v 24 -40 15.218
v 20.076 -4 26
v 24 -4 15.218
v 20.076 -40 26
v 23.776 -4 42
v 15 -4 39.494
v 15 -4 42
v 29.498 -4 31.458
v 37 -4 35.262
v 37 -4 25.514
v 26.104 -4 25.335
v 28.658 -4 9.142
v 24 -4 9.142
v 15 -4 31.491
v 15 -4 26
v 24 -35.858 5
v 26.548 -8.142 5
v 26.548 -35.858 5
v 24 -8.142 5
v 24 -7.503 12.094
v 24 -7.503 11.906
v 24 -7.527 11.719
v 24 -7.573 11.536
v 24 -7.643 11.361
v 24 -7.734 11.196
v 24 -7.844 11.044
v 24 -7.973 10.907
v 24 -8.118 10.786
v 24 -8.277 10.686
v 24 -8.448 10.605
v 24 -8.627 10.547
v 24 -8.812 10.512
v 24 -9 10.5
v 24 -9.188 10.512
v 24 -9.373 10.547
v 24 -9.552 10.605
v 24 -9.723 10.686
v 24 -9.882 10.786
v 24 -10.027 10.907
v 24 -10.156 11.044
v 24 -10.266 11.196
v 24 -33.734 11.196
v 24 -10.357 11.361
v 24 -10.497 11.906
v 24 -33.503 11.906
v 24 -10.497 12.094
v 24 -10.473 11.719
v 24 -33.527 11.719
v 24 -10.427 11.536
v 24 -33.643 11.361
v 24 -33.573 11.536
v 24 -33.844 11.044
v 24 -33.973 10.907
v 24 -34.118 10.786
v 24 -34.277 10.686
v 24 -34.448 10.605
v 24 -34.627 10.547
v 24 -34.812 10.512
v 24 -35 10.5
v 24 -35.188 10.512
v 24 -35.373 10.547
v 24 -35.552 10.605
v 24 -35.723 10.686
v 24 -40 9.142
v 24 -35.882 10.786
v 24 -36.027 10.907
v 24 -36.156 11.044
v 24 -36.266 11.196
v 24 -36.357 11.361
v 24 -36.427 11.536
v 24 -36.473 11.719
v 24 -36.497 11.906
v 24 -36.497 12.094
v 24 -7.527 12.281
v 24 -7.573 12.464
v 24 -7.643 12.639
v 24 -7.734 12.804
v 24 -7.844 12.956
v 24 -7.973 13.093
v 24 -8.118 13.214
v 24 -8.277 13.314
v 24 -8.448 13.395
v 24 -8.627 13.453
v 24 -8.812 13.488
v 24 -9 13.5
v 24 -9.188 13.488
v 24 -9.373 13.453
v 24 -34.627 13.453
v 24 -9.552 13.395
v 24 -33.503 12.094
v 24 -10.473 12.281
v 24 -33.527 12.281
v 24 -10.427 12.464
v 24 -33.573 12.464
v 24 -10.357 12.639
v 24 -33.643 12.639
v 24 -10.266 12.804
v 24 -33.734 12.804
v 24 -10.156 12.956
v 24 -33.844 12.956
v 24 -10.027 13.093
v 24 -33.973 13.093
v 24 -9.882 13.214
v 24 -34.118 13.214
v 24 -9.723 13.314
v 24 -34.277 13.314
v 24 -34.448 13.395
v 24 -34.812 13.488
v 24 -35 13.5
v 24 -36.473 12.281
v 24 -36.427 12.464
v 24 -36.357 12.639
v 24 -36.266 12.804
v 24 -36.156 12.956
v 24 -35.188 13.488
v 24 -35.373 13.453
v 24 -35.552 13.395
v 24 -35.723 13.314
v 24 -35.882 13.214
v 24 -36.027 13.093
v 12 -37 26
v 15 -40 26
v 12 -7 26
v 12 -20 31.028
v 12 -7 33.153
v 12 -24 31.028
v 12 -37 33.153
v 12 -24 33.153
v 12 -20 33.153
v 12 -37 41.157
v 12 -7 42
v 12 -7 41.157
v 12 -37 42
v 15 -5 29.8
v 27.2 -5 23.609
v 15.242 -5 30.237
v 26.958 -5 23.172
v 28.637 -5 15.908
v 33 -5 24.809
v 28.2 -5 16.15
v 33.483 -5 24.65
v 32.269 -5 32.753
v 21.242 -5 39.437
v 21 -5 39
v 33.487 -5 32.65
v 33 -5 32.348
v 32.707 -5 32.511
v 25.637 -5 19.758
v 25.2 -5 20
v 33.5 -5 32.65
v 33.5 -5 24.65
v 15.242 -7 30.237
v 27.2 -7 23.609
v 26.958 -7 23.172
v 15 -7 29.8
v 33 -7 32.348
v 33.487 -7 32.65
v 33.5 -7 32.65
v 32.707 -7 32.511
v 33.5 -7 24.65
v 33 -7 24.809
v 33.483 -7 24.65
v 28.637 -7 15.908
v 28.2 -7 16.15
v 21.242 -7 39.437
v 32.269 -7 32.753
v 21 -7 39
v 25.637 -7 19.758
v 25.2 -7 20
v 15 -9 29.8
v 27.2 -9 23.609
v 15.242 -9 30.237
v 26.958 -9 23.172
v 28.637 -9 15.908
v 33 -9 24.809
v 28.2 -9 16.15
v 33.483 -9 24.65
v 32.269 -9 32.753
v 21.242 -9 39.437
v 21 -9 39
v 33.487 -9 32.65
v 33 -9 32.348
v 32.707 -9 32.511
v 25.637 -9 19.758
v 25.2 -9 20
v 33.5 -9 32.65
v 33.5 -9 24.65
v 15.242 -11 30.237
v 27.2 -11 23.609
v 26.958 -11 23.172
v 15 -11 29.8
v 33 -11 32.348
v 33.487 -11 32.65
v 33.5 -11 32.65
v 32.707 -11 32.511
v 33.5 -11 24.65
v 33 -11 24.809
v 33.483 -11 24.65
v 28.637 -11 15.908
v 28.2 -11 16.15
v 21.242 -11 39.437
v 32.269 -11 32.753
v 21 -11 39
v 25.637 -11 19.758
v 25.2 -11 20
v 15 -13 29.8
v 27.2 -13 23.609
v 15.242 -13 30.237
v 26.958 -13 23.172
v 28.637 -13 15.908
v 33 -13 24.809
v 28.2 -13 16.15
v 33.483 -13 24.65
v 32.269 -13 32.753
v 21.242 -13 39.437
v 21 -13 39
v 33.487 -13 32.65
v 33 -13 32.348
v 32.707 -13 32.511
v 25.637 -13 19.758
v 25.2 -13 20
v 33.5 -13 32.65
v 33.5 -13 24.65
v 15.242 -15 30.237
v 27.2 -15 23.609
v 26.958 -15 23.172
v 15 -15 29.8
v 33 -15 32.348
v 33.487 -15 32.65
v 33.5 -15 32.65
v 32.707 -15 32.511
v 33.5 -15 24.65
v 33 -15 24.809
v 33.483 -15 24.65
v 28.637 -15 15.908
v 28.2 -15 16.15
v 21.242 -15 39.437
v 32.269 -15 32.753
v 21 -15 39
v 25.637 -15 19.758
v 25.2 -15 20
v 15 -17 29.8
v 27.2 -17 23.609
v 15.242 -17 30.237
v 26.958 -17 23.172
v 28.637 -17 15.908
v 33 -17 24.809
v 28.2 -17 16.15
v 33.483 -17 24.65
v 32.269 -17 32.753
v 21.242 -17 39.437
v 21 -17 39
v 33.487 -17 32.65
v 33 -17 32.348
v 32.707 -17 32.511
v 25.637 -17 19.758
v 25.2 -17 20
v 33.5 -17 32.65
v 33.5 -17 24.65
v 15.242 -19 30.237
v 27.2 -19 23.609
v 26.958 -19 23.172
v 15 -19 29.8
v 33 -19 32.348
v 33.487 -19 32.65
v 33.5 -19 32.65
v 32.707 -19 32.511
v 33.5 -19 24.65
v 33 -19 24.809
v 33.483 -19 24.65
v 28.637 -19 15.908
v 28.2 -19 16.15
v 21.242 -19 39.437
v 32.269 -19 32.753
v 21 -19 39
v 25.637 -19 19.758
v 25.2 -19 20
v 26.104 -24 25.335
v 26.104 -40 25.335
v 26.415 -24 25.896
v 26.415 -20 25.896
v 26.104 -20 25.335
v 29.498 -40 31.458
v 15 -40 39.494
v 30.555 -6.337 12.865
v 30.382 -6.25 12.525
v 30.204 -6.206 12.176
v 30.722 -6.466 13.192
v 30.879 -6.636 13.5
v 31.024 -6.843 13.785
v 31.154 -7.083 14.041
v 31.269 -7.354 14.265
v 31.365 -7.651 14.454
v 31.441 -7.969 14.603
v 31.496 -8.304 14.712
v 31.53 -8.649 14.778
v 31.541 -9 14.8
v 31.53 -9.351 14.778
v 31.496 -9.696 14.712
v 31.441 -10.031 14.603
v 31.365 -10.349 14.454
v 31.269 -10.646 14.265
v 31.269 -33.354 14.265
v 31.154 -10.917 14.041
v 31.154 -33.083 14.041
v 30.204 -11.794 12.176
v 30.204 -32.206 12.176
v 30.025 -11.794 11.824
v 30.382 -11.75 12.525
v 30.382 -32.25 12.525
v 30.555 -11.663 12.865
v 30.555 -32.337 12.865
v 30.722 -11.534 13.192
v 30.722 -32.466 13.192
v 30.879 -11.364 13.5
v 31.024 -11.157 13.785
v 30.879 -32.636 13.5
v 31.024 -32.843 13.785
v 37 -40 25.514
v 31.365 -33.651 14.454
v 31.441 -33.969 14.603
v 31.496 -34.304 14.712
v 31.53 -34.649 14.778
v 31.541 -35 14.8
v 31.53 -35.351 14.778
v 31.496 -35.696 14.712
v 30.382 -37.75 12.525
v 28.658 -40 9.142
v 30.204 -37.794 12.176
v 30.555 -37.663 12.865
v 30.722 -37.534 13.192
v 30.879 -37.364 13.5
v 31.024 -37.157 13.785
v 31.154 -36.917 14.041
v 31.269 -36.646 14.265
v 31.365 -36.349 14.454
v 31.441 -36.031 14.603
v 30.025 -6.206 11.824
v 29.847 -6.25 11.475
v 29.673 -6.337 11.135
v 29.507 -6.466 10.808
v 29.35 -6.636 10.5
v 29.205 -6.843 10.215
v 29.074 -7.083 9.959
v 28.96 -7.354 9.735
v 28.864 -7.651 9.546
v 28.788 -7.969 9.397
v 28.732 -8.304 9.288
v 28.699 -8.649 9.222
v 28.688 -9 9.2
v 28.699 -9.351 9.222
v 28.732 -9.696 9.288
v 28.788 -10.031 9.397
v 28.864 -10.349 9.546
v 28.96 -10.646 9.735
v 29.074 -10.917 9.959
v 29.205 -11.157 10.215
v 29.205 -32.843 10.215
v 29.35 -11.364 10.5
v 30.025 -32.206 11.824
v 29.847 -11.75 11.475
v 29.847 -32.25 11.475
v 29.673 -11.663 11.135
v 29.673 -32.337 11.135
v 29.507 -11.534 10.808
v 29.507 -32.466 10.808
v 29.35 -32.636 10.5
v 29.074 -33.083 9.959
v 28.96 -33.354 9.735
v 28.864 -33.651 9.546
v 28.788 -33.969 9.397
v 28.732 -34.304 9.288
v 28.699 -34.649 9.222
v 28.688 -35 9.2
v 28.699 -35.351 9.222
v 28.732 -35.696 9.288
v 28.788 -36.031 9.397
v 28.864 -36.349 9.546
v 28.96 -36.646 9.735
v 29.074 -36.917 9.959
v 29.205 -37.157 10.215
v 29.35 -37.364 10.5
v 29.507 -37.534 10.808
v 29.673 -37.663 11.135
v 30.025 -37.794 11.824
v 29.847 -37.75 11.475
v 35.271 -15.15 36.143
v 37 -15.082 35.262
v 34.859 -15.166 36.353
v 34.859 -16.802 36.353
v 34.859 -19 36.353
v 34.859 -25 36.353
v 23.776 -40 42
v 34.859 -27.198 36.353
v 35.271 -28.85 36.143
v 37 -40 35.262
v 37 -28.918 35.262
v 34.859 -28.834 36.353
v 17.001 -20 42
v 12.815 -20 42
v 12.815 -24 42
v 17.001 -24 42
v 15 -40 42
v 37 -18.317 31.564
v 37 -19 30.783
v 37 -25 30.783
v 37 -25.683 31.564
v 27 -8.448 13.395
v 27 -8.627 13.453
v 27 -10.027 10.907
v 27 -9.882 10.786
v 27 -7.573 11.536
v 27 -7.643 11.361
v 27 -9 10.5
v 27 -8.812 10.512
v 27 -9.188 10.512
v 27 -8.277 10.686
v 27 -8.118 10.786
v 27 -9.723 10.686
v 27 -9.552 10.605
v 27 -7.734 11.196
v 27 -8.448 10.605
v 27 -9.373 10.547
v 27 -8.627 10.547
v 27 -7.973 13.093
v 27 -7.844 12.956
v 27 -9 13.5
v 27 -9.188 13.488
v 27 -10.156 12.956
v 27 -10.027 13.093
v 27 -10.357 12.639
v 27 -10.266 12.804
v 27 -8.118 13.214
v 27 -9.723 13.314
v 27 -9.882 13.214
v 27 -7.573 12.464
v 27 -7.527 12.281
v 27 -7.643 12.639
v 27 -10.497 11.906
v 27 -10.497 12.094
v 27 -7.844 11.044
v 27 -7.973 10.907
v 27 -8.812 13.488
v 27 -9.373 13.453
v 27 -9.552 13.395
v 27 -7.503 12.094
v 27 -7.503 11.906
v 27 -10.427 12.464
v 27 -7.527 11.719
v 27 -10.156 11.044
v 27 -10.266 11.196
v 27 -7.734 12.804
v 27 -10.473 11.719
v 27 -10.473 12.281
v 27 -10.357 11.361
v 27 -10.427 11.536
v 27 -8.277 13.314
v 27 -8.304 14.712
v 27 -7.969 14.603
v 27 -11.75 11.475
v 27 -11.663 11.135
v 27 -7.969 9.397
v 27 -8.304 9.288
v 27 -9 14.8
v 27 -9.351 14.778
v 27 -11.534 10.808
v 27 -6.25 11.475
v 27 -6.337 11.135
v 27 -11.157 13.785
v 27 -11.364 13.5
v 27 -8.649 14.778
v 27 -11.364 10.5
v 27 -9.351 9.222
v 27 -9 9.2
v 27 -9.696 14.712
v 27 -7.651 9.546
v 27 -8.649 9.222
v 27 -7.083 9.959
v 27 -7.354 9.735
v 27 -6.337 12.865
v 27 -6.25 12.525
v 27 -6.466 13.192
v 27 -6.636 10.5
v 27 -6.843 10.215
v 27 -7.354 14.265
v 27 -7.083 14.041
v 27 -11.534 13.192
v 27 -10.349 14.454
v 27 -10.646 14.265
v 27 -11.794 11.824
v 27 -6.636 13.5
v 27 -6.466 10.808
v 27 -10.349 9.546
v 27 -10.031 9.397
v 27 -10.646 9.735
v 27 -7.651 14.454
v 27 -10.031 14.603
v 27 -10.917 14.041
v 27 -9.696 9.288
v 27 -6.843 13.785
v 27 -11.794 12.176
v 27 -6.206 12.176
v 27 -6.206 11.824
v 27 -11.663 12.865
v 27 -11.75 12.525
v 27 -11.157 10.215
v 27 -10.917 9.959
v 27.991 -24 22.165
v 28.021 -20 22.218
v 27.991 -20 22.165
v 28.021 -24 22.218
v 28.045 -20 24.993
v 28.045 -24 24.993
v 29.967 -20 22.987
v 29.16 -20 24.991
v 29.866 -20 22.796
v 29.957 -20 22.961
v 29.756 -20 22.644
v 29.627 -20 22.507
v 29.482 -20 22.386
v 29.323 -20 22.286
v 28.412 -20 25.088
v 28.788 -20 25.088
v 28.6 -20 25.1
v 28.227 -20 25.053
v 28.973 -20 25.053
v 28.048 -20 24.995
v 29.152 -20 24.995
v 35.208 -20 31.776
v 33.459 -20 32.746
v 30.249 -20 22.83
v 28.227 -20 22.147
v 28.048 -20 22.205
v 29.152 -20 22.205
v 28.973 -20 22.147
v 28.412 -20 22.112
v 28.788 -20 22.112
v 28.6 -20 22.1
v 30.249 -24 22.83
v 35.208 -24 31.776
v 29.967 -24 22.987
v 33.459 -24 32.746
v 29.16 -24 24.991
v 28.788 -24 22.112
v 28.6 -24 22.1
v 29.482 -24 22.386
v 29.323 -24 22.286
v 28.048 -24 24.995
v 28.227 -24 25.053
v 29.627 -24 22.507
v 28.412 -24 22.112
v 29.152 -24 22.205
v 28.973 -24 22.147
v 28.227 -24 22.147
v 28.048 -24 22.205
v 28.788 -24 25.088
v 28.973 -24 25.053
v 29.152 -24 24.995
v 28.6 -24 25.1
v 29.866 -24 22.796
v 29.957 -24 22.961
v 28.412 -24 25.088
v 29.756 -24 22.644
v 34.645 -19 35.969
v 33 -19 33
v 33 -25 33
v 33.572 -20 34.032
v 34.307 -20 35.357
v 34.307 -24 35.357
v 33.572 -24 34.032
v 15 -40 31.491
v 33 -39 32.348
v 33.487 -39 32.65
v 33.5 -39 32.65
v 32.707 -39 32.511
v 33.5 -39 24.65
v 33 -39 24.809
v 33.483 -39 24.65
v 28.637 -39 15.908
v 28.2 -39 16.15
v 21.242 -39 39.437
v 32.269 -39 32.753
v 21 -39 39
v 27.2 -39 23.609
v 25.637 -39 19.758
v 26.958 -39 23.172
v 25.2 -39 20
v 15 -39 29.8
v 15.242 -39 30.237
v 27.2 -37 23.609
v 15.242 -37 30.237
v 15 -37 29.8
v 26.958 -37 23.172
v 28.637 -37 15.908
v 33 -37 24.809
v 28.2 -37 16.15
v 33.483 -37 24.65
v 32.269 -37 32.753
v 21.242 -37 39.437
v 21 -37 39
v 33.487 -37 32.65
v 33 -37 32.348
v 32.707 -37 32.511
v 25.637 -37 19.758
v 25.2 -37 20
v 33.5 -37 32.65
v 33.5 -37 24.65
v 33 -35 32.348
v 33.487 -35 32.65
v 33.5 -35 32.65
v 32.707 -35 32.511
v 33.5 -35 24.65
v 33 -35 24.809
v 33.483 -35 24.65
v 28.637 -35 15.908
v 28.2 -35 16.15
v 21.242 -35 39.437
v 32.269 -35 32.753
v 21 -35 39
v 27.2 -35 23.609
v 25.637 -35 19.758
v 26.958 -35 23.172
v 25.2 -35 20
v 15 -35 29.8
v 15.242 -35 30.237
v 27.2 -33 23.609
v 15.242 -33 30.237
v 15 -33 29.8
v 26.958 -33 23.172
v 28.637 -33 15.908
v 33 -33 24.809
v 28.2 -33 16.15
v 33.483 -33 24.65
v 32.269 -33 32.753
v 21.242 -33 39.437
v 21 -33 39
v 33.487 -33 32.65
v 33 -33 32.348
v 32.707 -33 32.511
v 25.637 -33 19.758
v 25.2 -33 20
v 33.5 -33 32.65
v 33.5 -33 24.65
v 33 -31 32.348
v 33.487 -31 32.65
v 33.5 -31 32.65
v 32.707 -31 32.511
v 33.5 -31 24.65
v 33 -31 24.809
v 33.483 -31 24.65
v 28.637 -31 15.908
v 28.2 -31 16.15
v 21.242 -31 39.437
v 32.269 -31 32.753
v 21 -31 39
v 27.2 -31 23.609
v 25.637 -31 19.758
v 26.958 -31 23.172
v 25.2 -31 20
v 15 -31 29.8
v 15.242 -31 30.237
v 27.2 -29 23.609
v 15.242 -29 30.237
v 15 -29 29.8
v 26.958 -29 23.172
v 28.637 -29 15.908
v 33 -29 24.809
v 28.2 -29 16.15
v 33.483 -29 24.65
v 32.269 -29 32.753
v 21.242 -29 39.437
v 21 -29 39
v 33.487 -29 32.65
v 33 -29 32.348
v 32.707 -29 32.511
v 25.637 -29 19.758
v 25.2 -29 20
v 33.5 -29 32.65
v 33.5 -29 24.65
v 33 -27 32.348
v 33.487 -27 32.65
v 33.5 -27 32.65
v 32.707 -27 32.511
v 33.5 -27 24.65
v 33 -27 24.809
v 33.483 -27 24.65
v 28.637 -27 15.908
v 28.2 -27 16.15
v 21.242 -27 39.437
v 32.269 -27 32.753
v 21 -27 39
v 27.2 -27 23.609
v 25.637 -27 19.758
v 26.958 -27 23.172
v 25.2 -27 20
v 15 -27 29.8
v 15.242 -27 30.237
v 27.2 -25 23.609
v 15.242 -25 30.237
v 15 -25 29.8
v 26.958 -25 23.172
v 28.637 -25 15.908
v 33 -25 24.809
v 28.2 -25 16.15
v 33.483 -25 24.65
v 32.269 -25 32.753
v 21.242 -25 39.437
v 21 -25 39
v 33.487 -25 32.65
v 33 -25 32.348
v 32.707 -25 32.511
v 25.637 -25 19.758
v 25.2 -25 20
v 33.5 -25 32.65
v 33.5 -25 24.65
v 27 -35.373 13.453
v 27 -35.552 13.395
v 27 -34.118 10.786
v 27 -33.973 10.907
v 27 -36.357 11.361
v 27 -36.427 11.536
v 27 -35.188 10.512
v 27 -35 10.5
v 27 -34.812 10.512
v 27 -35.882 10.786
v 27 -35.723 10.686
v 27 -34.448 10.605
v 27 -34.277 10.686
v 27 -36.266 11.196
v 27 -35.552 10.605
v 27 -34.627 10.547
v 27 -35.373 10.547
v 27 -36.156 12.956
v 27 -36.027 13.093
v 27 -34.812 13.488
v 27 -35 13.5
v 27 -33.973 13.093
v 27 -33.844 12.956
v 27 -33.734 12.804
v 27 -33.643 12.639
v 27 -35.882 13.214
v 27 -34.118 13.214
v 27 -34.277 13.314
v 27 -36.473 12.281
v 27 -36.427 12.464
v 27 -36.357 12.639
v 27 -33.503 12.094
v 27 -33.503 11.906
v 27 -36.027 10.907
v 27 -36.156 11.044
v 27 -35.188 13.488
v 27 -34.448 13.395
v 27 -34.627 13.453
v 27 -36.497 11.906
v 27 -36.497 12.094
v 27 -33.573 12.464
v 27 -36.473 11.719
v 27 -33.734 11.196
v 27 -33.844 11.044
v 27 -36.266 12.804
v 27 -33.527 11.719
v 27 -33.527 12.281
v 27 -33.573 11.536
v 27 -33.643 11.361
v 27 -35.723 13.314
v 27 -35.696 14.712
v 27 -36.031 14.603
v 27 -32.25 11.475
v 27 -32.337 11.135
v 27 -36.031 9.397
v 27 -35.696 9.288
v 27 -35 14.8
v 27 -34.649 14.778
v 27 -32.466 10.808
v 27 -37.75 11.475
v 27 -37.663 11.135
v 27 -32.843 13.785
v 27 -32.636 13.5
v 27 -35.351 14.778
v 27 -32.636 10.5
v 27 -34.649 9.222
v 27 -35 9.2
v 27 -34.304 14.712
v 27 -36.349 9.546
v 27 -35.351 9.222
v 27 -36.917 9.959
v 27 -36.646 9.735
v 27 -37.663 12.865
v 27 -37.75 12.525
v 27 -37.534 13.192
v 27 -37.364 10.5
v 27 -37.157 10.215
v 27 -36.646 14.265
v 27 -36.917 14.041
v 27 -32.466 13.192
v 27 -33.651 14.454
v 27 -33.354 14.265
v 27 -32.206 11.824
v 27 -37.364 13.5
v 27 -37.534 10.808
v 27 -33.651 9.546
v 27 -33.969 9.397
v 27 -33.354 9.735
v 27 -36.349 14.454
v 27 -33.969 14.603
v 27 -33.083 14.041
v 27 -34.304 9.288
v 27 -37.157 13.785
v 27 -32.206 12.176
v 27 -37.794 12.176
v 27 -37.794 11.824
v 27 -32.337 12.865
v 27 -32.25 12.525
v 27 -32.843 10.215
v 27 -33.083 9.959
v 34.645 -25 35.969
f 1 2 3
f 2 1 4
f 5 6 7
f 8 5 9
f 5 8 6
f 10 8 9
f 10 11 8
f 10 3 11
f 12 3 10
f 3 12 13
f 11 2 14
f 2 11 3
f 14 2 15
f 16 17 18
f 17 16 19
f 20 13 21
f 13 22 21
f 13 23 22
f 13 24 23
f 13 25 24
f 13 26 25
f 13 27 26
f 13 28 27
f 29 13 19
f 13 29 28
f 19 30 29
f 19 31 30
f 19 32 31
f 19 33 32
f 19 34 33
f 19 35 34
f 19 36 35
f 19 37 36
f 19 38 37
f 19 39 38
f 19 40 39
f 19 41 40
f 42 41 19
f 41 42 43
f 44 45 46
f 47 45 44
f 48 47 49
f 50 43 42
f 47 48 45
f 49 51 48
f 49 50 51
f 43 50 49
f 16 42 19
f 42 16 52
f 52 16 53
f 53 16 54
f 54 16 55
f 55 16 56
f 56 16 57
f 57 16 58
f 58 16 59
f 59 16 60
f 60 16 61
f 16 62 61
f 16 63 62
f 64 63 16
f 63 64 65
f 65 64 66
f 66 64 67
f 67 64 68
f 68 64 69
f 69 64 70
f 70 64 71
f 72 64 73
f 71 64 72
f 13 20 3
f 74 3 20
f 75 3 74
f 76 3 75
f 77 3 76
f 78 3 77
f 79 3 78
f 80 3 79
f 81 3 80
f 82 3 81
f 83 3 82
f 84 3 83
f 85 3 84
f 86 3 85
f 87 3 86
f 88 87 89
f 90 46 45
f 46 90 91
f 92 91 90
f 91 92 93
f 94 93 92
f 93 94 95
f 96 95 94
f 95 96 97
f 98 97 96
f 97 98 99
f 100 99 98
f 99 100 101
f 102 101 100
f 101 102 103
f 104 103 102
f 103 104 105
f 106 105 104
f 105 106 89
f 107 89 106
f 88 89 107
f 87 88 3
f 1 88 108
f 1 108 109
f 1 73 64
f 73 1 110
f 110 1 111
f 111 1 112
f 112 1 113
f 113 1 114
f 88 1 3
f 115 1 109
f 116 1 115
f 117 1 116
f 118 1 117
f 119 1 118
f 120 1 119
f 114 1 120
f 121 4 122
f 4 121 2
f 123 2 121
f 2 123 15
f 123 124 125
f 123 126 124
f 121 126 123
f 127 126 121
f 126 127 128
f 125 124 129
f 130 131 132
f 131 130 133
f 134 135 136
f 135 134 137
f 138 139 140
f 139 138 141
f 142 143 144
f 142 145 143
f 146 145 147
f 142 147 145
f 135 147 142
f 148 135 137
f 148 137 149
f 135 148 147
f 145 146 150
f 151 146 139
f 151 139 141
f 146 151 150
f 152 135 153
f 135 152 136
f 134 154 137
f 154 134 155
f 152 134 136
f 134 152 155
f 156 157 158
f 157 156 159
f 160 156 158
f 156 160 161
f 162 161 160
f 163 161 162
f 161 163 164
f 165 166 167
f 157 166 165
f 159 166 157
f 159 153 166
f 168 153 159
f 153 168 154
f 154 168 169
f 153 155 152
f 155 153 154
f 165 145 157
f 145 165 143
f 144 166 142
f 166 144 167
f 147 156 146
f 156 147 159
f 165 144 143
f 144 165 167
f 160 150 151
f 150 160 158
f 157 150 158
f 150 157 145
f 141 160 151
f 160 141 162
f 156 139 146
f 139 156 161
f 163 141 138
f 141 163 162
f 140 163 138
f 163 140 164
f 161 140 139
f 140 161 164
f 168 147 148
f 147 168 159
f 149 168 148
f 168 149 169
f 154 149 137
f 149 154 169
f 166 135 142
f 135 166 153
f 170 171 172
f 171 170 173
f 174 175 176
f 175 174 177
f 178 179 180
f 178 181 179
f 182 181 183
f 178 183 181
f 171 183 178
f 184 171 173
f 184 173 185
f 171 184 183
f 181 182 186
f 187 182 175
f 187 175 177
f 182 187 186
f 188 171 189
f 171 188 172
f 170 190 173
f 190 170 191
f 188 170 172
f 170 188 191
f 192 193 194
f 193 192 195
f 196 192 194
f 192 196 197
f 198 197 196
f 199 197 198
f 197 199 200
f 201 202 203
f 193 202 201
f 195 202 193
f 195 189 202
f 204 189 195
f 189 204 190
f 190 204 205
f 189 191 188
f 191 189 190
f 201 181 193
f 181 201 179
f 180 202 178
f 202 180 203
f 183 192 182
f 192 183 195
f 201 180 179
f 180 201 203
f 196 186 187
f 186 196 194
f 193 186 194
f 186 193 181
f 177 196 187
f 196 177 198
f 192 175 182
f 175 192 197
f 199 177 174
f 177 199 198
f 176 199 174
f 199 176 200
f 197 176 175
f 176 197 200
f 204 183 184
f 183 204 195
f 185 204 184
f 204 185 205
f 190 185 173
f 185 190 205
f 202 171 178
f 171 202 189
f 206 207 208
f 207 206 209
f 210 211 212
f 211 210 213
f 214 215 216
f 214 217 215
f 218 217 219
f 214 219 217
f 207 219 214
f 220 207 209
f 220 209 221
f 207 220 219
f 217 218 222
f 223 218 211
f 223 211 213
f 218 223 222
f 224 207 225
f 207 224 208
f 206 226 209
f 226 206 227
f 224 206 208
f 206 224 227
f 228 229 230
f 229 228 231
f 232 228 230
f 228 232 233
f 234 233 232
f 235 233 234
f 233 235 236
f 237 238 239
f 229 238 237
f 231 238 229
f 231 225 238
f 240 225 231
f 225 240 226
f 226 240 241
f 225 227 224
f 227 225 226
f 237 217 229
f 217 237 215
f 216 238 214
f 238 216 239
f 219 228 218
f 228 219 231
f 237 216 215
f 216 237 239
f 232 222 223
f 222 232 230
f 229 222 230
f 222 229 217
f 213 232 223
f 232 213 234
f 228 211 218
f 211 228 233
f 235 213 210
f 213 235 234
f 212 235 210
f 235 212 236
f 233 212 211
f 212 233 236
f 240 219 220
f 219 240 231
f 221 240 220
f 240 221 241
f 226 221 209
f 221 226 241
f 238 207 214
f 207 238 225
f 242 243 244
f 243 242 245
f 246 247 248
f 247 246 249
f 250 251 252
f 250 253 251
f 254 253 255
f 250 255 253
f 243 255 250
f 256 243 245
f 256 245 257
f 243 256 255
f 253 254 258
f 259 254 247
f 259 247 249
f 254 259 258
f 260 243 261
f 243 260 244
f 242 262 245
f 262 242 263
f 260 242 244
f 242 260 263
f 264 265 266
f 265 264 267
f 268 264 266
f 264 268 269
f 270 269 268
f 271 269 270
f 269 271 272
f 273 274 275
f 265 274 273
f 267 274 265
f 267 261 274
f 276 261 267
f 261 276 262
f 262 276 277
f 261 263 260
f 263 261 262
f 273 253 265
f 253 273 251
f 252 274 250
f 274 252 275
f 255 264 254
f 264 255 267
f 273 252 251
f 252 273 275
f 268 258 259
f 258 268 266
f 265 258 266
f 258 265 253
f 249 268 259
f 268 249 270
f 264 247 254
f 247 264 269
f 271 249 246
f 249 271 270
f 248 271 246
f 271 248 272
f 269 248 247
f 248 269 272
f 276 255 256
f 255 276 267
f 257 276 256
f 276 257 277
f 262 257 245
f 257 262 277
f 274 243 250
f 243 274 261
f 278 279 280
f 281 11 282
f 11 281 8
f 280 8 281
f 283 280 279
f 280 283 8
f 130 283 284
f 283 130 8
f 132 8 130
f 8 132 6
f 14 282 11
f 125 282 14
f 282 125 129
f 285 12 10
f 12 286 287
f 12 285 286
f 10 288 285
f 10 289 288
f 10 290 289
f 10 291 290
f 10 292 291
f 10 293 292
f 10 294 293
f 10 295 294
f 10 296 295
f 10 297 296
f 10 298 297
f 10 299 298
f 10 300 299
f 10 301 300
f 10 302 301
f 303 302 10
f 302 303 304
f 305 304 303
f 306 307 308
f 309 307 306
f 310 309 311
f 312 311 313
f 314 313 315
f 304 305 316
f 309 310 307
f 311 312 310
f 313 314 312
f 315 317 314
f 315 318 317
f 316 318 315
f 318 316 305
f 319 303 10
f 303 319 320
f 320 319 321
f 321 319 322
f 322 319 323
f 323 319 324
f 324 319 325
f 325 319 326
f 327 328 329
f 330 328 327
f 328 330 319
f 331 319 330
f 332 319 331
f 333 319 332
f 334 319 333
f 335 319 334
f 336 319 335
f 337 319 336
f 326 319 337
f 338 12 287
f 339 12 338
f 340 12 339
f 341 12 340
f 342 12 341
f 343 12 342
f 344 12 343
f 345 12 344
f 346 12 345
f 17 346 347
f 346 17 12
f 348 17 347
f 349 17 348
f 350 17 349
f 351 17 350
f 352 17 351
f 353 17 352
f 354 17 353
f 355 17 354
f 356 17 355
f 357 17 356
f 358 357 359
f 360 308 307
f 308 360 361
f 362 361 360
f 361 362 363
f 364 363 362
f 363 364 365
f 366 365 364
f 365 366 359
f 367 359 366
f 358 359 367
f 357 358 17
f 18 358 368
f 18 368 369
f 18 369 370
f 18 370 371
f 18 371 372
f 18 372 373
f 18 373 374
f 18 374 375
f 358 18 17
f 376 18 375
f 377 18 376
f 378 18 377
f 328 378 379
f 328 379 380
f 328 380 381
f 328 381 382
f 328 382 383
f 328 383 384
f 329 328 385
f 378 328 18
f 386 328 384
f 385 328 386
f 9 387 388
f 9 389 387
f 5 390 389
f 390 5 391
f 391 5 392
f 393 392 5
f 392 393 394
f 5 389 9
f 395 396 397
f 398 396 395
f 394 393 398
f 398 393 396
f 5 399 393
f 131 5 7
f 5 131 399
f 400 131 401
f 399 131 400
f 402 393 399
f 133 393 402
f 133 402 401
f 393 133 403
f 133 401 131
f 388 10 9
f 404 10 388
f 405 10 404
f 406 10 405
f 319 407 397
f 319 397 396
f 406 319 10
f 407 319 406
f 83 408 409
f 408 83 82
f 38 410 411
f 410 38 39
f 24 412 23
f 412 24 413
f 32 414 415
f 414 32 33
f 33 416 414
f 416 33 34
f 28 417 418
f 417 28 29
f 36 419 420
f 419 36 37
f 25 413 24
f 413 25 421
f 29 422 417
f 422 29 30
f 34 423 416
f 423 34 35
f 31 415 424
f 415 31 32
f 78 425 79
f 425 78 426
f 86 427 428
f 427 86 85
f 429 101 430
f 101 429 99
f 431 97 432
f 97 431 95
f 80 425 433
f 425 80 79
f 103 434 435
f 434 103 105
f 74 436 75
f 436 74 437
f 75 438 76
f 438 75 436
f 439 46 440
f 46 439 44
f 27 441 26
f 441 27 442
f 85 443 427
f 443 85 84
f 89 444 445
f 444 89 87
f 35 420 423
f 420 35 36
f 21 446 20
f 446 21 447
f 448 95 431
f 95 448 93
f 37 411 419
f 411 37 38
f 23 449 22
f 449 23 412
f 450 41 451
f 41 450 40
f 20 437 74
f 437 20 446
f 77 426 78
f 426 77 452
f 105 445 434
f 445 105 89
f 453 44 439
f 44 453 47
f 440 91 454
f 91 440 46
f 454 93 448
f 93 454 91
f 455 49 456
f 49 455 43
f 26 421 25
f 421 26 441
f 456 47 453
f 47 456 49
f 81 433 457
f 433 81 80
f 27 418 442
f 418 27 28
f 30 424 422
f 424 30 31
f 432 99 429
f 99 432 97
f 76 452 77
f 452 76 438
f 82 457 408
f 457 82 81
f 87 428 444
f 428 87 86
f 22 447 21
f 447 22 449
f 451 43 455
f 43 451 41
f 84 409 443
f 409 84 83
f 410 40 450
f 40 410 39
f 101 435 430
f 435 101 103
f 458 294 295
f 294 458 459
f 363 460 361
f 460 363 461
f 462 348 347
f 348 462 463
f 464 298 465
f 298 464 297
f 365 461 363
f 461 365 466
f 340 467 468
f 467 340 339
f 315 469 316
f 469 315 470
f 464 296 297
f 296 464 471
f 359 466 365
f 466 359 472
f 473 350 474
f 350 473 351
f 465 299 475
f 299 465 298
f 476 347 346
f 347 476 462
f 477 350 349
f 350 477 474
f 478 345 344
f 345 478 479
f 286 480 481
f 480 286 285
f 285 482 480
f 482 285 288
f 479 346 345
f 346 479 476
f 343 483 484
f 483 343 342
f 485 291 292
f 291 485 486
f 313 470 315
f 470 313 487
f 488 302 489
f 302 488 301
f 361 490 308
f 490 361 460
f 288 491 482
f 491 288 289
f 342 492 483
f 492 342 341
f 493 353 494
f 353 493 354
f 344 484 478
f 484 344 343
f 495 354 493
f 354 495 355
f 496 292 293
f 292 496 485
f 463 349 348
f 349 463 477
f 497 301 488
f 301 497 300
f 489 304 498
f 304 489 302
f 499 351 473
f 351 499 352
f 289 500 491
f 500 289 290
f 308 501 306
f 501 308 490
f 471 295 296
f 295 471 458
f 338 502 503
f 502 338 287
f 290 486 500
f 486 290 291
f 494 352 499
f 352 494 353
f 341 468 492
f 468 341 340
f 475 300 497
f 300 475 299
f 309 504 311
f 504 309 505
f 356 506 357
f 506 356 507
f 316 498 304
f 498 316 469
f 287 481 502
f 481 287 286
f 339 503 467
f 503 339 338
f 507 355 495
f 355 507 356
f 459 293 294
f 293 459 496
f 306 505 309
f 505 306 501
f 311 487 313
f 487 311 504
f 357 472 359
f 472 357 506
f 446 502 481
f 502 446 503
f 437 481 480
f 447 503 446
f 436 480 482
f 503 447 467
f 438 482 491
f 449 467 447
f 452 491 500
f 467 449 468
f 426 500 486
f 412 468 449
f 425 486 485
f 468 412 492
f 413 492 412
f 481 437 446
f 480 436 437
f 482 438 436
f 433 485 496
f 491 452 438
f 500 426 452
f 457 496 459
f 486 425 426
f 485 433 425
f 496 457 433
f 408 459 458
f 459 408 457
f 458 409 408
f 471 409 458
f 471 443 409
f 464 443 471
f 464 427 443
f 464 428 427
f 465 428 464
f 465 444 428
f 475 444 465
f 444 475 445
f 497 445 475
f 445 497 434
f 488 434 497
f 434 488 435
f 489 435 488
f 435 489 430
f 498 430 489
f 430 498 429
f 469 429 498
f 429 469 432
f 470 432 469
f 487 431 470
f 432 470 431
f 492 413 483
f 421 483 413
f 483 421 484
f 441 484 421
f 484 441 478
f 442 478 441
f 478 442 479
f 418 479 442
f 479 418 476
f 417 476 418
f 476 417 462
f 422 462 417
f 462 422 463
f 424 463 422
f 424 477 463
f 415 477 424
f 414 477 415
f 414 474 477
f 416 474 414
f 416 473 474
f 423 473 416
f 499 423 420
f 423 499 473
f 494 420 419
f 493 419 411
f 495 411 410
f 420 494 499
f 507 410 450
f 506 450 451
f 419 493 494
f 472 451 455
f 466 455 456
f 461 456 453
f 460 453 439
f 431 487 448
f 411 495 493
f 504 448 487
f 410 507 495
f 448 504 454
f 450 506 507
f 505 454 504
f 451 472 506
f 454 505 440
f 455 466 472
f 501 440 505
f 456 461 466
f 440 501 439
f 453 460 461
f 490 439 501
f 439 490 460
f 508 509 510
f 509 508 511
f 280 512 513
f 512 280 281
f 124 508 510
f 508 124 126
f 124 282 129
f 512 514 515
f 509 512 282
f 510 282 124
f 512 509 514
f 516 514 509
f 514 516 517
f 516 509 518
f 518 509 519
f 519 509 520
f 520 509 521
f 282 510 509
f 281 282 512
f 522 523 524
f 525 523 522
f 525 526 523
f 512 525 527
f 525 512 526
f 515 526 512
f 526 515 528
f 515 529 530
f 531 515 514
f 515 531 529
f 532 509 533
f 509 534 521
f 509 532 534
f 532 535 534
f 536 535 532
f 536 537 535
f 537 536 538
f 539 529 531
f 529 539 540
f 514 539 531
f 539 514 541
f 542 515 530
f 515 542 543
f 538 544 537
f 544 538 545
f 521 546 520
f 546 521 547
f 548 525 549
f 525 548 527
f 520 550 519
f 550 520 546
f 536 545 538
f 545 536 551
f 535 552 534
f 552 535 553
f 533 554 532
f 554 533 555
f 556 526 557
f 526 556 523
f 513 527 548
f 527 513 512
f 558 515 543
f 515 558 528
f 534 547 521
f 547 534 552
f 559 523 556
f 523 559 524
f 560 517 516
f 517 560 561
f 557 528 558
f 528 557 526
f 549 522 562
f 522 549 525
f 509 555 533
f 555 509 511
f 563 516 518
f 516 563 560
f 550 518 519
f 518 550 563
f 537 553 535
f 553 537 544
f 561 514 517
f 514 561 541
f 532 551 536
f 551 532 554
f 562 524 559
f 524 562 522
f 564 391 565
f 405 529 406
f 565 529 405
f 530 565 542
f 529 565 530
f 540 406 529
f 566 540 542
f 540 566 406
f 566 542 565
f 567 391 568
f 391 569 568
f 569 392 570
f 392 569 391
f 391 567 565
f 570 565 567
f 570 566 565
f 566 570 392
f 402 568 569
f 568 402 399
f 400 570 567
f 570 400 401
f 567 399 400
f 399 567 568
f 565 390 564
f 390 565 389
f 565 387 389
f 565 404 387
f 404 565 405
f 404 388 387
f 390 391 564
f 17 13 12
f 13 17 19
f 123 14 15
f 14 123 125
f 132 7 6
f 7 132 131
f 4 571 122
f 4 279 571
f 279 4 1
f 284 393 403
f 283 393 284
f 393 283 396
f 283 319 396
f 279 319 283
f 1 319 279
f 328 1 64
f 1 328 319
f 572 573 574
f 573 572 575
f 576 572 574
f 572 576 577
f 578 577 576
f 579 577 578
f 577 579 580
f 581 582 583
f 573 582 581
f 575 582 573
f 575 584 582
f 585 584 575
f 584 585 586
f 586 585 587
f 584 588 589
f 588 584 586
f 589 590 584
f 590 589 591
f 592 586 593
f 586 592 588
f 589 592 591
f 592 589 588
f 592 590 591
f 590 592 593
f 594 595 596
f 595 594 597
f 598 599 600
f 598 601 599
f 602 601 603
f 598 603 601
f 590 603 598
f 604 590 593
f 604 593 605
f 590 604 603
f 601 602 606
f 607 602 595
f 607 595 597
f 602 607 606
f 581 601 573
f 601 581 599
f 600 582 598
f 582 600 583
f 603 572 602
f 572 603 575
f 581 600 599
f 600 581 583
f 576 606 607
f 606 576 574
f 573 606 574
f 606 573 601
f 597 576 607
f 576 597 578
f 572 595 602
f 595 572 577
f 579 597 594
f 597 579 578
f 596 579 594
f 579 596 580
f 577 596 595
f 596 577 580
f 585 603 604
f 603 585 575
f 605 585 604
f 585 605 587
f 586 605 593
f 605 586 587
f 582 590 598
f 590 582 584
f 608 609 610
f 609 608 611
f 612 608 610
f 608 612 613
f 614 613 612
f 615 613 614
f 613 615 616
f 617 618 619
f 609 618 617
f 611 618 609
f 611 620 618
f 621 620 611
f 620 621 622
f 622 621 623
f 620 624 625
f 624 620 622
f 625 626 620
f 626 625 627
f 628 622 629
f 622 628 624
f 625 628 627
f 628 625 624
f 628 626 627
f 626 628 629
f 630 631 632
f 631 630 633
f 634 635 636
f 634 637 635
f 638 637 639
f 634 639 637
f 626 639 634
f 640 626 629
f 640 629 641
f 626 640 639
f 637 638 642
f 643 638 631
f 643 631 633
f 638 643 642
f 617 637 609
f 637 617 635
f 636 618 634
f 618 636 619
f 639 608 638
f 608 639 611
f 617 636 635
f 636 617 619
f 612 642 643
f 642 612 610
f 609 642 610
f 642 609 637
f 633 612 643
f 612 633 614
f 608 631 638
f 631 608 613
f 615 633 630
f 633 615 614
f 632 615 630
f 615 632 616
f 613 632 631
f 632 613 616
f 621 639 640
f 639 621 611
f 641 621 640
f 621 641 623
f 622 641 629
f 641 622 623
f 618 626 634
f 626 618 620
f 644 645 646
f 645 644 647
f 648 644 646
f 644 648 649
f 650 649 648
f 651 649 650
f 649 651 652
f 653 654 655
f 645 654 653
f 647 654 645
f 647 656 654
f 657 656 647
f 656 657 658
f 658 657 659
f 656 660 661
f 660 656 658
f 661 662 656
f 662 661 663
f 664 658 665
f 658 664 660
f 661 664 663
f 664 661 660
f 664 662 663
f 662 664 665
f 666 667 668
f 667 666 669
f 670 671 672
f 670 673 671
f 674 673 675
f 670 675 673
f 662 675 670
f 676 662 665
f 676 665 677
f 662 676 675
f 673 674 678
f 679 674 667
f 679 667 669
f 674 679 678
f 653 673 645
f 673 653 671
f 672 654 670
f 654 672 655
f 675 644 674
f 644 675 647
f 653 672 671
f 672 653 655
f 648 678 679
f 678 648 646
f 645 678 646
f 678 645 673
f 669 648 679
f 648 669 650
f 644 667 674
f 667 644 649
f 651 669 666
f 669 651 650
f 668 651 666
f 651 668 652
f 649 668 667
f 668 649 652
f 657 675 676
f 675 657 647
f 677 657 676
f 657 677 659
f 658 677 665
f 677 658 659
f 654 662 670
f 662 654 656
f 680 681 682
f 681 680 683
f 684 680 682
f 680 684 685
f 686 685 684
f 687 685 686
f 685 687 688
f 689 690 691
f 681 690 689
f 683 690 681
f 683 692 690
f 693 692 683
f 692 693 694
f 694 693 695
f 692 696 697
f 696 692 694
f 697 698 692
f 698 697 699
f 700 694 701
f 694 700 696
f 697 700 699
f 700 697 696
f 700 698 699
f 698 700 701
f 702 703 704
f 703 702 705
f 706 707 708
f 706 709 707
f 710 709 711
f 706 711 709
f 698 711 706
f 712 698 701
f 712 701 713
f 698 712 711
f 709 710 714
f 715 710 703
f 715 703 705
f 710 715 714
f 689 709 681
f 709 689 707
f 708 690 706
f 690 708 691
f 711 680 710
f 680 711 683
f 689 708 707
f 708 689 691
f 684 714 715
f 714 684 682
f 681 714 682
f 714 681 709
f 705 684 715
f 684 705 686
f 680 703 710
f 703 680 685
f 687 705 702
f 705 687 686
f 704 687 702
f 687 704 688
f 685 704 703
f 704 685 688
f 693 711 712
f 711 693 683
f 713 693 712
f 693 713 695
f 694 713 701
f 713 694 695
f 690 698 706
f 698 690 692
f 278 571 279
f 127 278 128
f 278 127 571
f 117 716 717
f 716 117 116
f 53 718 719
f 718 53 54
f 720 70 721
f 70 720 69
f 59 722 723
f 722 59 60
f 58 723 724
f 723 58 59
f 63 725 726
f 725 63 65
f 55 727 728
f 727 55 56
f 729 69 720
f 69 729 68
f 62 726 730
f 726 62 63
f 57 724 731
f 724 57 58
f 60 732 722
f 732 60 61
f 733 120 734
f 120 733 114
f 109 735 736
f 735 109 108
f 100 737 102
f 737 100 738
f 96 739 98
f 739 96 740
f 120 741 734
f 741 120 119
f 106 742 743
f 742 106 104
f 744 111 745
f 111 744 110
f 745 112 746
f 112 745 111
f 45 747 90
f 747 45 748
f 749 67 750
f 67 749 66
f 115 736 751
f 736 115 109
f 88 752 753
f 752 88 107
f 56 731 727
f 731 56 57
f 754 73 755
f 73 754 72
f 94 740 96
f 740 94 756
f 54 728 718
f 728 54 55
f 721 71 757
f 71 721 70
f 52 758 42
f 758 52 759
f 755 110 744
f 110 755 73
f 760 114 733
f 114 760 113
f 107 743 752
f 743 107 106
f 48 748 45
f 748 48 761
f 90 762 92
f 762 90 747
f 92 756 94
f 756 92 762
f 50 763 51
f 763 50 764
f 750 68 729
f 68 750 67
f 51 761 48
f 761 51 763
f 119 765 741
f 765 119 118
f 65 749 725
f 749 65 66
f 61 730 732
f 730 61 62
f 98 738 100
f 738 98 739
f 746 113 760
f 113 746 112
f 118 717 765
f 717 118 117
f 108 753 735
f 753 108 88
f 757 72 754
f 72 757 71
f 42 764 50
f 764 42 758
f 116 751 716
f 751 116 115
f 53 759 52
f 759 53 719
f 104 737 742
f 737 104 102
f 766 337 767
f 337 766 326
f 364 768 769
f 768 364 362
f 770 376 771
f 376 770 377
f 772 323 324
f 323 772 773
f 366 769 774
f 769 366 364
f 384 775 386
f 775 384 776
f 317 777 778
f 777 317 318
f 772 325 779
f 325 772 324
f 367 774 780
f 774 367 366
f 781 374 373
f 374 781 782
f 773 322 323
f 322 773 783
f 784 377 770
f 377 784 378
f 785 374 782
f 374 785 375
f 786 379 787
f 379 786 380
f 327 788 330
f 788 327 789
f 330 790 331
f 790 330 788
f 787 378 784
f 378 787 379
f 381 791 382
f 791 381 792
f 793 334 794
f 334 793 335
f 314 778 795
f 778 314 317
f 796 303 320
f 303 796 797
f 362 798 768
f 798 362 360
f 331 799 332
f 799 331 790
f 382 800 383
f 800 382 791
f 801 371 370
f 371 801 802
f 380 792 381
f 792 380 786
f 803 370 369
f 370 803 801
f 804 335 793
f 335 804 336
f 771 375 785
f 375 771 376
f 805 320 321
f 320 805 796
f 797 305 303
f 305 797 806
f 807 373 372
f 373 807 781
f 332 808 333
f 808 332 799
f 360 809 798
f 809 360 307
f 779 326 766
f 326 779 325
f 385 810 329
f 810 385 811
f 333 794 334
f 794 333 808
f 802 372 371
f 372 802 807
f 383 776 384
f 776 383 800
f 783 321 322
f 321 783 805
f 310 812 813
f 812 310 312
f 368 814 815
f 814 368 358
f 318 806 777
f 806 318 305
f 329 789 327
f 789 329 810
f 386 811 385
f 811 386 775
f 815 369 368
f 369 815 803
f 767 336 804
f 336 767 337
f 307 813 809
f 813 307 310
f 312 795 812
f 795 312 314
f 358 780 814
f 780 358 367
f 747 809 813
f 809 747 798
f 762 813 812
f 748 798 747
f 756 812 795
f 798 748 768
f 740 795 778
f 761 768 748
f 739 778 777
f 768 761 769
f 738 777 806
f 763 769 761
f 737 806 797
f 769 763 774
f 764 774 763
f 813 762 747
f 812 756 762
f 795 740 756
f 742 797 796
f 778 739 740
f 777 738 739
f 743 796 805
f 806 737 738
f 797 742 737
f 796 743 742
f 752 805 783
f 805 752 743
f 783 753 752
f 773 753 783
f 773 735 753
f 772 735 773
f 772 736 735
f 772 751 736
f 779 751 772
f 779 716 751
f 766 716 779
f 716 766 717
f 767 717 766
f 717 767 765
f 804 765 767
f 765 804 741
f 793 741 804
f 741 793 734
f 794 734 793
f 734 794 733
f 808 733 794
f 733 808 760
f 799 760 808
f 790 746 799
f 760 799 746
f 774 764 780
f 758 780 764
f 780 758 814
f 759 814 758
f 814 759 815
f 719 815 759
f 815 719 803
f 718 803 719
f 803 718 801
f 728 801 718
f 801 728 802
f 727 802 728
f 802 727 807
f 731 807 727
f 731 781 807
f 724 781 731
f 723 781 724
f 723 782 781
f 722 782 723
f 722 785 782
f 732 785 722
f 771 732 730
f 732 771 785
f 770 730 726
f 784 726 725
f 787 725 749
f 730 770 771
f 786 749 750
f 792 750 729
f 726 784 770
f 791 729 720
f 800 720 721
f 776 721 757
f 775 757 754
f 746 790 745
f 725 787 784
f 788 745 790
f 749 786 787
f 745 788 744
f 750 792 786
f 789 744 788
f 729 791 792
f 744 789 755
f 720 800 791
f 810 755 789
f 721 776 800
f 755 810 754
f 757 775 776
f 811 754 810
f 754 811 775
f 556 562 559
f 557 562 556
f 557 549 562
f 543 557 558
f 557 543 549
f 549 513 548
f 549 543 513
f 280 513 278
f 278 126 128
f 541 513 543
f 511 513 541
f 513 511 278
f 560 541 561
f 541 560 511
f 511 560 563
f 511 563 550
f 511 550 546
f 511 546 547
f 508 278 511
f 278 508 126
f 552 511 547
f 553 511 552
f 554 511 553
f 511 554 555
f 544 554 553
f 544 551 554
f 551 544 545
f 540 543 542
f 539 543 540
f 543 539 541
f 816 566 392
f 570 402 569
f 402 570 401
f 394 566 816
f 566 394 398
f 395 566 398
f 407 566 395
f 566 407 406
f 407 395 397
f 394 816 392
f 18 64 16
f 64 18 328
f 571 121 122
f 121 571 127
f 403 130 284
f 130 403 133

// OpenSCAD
// PRUSA MM upgrade
// e-motor-holder
// GNU GPL v3
// Josef Průša <iam@josefprusa.cz> and contributors
// http://www.reprap.org/wiki/Prusa_Mendel
// http://prusamendel.org

module selinfill(){
  translate([15,0,29.8]) rotate([0,29,0]) cube([14,2,0.5]);

  translate([21,0,39]) rotate([0,29,0]) cube([14,2,0.5]);
  translate([33,0,24.65]) cube([0.5,2,8]);
  translate([28.2,0,16.15]) rotate([0,29,0]) cube([0.5,2,10]);
  translate([25.2,0,20]) rotate([0,29,0]) cube([0.5,2,15]);
}

module holder(){
  difference(){
    union(){
      translate([16.8,-22,35]) rotate([0,70,0]) cube([30,18,14]);
      translate([24,-22,5]) cube([17,18,35]);
      translate([12,-22,26]) cube([30,18,24]);
    }
    translate([-22,-26,52]) rotate([0,29,0]) cube([55,55,7]);
    translate([24,-28,0]) rotate([0,27,0]) cube([15,55,40]);
    translate([12,-28,48]) rotate([0,27,0]) cube([40,55,20]);
    translate([11,-28,42]) cube([40,55,20]);
    translate([37,-28,22]) cube([20,55,20]);

    translate([8,-9,12]) rotate([0,90,0]) cylinder(h=25,r=1.5,$fn=50);
    translate([27,-9,12]) rotate([0,90,0]) cylinder(h=6,r=2.8,$fn=50);

    // Ziptie.
    translate([7,-22,33.8]) rotate([0,29,0]) cube([24,2,2.5]);
    translate([28.5,-22,23.8]) rotate([0,29,0]) cube([2,2,17]);
    translate([28.6,-20,23.6]) rotate([90,90,0]) cylinder(h=2,r=1.5,$fn=50);
    translate([33.0,-22,33.0]) rotate([0,29,0]) cube([5,3,4]);
    translate([5,-22,45]) rotate([0,21,0]) cube([50,2,1.5]);
    translate([33.0,-19,33.0]) rotate([45,29,0]) cube([5,6,4]);

    translate([0,-7,0]) selinfill();
    translate([0,-11,0]) selinfill();
    translate([0,-15,0]) selinfill();
    translate([0,-19,0]) selinfill();

    // Edges.
    translate([20,-2,-3]) rotate([45,0,0]) cube([20,10,10]);
    translate([10,-9,20]) rotate([0,0,45]) cube([10,10,30]);
  }
}

holder();
translate([0,-44,0]) mirror([0,1,0]) holder();
